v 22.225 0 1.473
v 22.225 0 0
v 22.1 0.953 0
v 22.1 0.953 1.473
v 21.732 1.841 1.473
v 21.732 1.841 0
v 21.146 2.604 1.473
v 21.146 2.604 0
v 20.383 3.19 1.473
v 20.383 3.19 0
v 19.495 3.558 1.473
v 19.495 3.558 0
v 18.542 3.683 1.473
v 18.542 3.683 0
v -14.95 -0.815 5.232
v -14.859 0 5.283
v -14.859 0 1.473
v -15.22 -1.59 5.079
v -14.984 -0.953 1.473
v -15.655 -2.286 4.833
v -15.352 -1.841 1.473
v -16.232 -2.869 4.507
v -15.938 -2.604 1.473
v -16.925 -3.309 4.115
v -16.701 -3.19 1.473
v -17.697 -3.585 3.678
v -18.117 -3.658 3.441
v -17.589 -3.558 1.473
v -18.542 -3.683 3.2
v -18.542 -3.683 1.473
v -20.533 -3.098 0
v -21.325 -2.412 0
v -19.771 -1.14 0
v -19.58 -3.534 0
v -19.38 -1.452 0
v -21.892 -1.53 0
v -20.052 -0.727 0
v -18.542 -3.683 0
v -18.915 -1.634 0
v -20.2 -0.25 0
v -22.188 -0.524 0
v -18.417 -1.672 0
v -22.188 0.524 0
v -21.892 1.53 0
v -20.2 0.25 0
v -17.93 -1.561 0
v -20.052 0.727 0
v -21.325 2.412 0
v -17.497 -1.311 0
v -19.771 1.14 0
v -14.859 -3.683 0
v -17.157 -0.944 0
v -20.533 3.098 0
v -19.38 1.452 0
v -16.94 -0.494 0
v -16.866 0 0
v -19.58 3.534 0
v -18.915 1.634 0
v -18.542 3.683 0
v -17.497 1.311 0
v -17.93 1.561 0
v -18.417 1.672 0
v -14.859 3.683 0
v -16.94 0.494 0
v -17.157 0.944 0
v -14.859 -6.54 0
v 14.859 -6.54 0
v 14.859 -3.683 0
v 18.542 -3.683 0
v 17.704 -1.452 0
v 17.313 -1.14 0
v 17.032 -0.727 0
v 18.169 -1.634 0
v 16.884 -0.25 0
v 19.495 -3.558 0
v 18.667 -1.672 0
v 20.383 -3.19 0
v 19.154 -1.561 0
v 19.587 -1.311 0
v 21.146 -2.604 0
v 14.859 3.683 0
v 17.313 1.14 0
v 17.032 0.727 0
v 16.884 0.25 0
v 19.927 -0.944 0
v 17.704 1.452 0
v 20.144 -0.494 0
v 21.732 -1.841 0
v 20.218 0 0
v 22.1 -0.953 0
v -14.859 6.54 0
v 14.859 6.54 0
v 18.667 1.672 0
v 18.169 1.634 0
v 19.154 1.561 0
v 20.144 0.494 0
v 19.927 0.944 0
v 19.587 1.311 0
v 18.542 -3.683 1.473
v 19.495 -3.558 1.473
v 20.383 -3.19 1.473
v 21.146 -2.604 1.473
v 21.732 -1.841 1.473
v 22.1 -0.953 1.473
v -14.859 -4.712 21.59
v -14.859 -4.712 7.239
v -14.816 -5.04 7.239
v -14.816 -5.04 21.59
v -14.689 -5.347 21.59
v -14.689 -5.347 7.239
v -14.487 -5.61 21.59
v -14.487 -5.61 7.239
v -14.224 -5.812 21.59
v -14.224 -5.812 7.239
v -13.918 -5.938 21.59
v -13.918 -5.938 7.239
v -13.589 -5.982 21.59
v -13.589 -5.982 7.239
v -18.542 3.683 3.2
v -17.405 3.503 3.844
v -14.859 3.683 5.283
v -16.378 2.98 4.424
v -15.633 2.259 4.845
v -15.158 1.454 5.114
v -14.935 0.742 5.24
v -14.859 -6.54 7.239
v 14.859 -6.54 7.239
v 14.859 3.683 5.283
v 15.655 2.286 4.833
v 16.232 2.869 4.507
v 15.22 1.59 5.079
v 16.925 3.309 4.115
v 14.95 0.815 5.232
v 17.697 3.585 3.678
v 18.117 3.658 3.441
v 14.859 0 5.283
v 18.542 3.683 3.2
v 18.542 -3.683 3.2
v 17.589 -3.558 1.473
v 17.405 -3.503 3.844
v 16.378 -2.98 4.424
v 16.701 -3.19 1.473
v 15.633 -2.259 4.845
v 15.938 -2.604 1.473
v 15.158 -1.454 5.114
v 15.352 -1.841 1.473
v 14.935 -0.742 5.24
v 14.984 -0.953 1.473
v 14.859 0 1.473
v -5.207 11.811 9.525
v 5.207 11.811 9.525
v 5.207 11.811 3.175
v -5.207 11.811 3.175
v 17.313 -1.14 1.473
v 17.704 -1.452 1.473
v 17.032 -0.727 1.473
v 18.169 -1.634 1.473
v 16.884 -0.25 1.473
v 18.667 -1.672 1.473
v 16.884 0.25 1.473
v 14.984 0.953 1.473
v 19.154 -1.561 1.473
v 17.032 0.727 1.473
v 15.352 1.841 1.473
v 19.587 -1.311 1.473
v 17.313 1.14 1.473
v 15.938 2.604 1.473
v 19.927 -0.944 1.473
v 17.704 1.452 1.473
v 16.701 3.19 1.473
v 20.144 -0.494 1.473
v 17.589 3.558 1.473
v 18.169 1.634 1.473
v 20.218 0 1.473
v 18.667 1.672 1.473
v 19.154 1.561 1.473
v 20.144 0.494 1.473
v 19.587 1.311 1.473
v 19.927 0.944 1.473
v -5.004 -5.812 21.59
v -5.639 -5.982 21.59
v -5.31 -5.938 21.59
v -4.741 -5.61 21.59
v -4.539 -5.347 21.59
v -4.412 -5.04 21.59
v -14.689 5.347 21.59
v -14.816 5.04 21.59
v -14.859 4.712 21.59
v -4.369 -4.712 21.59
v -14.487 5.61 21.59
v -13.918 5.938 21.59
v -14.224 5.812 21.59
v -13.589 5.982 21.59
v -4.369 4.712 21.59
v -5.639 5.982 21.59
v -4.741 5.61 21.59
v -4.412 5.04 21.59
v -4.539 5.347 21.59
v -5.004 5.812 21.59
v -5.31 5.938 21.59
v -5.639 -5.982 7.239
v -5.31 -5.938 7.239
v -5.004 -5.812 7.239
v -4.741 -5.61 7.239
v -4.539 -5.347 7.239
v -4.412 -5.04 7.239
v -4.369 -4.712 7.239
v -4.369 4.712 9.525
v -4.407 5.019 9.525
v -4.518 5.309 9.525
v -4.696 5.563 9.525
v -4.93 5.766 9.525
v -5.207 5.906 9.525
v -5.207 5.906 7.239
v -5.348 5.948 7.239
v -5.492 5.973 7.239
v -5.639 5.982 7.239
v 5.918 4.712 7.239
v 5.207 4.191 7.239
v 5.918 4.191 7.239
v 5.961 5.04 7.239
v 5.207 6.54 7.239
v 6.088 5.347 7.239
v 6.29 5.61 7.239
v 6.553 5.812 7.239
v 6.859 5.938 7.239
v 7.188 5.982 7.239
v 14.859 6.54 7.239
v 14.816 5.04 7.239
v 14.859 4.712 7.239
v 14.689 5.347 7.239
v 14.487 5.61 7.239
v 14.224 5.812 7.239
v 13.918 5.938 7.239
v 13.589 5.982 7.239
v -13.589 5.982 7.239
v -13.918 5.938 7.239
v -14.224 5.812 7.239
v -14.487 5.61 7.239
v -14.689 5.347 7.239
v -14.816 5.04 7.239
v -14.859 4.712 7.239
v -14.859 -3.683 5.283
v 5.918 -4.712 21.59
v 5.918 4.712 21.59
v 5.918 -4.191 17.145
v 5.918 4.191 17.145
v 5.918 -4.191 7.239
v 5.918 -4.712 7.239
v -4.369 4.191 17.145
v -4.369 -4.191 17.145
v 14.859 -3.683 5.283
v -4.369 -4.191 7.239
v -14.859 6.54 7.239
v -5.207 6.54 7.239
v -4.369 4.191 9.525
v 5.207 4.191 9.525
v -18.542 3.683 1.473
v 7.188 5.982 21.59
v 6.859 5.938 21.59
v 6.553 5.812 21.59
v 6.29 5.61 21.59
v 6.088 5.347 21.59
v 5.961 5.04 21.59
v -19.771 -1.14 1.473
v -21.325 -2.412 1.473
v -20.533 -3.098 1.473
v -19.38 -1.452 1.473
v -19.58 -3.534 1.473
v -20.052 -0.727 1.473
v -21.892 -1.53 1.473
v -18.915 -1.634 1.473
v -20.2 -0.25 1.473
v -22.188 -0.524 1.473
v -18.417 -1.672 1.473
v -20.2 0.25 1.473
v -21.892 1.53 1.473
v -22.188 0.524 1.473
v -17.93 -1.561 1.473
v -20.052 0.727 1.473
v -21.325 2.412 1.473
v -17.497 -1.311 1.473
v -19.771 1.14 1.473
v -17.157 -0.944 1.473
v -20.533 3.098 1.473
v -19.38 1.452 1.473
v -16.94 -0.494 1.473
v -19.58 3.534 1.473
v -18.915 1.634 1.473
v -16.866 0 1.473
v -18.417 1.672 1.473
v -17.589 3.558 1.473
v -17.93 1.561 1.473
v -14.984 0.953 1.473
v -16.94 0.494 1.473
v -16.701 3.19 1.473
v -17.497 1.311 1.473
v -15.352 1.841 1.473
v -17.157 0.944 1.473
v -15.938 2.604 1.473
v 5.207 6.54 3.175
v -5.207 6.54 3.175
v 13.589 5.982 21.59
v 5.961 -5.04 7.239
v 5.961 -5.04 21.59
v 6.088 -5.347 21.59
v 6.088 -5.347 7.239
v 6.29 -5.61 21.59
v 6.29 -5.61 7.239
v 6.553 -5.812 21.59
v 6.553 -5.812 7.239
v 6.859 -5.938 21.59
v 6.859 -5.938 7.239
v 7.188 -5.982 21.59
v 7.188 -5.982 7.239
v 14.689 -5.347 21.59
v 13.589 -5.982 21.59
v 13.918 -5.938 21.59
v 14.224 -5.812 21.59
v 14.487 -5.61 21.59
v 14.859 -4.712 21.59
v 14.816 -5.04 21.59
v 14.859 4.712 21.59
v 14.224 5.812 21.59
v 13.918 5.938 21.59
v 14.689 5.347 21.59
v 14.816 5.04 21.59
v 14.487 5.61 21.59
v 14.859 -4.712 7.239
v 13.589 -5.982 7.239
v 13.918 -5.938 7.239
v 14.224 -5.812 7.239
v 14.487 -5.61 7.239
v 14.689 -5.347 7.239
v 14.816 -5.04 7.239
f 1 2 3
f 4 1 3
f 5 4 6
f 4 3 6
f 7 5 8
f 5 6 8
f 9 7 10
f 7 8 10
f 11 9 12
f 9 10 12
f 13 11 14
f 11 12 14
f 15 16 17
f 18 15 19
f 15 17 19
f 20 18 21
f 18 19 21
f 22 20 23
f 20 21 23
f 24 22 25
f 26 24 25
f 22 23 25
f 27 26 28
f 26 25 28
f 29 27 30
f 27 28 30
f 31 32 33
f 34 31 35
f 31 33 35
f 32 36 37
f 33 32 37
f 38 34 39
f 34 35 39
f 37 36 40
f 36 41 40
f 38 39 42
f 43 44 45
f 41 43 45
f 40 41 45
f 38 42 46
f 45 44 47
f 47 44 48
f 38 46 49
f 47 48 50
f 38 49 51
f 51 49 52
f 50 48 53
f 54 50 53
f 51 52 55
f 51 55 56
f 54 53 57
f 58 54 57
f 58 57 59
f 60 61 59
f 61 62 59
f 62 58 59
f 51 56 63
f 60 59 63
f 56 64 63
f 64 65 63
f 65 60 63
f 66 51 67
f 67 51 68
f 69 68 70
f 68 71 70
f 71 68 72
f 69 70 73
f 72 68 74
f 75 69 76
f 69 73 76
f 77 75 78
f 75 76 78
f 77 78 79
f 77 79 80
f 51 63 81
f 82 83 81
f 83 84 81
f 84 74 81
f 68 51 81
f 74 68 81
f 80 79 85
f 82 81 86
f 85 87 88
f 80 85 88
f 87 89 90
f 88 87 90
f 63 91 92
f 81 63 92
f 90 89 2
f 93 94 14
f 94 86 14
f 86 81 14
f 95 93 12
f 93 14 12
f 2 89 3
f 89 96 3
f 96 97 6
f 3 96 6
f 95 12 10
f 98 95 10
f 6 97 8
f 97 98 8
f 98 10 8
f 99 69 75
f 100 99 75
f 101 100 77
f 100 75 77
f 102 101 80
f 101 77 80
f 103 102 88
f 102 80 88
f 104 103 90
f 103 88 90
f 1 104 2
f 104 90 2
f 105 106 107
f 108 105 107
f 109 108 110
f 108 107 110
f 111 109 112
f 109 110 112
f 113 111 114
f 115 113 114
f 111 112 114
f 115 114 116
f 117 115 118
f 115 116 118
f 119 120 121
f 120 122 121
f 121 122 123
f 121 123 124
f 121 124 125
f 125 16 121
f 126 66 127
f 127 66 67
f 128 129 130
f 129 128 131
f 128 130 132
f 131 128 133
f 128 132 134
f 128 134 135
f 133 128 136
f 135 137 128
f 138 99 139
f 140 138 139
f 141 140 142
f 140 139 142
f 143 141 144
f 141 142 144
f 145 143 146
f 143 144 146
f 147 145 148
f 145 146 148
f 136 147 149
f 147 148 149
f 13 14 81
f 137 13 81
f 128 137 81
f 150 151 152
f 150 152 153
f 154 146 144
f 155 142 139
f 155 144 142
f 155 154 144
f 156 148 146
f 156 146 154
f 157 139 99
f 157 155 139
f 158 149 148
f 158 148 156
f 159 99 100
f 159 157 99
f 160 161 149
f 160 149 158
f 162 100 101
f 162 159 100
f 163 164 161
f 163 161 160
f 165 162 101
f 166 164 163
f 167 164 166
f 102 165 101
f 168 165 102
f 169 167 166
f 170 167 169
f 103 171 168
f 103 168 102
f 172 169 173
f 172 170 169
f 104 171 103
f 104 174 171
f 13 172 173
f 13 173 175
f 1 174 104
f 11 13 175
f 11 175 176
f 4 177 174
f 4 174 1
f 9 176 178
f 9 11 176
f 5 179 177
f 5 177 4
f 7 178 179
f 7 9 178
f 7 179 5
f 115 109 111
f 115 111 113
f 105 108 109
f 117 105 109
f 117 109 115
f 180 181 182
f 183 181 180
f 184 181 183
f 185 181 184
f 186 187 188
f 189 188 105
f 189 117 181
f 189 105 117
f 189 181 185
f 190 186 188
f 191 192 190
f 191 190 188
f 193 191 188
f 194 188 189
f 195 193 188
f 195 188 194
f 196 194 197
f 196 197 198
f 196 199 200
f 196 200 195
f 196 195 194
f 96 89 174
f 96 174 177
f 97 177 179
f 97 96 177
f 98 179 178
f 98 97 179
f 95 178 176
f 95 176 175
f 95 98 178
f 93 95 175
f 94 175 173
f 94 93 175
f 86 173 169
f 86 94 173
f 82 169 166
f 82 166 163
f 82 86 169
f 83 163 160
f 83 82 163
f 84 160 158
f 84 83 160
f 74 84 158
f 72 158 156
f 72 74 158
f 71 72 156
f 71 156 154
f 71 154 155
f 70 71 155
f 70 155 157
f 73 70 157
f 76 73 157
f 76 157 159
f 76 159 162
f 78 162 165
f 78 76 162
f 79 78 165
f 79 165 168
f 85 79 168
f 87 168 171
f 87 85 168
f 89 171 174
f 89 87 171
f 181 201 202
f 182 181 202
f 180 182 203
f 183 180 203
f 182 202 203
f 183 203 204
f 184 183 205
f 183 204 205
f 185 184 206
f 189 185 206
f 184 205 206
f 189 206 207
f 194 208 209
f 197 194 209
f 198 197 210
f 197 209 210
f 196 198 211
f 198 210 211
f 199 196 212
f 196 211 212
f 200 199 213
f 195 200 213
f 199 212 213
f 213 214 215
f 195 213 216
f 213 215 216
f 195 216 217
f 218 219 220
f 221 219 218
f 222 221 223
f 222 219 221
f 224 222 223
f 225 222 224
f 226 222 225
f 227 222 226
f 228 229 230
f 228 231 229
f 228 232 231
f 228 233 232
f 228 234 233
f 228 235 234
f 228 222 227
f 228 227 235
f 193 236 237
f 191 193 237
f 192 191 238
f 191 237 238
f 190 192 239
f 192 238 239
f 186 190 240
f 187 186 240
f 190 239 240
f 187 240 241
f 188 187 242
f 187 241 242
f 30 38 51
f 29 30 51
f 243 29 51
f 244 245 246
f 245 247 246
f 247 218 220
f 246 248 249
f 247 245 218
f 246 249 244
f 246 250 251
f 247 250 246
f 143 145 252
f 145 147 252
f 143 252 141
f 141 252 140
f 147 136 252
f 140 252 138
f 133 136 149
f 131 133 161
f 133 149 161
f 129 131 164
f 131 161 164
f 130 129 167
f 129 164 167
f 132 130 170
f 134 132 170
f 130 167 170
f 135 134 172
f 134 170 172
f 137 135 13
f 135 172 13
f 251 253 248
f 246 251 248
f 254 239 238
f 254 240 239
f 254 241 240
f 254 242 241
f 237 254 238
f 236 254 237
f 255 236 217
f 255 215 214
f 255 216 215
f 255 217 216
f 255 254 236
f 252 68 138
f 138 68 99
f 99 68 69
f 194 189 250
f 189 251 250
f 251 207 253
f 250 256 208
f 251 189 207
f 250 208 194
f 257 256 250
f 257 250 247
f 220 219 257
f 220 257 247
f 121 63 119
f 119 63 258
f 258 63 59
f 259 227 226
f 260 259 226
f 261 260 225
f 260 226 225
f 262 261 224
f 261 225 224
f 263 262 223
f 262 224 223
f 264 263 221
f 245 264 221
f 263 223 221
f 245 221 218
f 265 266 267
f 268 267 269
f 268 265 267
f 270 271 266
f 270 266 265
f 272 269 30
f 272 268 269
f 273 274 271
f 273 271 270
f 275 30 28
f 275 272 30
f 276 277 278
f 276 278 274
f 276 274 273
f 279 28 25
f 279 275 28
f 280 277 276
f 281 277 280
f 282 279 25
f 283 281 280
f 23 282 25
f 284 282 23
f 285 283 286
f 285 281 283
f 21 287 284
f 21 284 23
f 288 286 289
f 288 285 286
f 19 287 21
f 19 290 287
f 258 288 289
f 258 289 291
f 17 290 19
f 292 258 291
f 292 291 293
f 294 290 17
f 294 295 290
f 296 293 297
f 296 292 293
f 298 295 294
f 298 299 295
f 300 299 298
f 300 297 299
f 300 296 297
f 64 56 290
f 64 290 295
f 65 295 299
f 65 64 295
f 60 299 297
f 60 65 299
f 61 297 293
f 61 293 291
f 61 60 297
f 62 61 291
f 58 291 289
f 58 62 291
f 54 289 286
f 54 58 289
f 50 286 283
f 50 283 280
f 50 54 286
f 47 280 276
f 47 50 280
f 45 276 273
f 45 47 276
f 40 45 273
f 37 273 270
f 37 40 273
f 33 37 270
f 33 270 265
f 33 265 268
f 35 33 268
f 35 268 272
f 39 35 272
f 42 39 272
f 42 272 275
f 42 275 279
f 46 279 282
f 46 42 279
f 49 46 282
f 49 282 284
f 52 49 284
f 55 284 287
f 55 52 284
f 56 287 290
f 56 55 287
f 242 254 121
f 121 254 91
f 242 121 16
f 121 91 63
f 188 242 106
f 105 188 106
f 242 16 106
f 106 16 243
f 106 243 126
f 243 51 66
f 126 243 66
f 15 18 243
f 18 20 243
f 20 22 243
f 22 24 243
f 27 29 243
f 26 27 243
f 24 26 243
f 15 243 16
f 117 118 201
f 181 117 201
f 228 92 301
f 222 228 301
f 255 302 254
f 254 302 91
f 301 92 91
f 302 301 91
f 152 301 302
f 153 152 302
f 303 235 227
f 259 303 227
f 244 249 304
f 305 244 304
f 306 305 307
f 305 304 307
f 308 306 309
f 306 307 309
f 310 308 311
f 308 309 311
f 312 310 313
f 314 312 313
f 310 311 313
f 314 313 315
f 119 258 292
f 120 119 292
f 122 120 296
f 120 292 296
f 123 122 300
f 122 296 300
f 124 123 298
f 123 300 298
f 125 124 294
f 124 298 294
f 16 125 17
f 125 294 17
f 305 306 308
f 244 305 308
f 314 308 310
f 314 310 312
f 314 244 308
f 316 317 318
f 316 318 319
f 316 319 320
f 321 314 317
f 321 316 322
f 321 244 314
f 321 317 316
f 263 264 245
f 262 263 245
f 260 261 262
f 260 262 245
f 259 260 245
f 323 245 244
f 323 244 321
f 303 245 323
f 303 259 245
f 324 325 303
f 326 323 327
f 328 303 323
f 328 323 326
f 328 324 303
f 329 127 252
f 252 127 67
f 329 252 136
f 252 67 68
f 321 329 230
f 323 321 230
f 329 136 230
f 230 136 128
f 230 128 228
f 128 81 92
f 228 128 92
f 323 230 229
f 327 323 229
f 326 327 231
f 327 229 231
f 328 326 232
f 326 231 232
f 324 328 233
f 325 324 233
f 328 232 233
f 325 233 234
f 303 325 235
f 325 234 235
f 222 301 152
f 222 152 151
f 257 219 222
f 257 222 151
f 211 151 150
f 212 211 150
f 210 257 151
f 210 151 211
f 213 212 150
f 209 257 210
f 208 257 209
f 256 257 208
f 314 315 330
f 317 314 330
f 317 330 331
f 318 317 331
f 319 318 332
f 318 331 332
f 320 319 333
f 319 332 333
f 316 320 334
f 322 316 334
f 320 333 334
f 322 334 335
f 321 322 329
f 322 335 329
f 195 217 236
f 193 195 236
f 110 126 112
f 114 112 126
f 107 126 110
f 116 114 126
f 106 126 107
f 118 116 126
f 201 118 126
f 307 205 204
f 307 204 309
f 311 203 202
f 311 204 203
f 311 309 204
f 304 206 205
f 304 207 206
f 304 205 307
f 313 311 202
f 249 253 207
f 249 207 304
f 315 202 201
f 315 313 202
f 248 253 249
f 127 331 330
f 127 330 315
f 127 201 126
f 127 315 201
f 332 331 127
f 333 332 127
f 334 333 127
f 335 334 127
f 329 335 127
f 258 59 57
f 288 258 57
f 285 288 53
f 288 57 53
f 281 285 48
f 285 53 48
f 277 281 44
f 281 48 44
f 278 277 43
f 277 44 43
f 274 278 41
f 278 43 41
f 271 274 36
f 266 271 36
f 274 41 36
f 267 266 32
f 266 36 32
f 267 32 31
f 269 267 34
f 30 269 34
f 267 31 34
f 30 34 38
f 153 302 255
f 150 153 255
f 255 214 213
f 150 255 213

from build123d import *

# Parameters (mm, degrees)
F0_R      = 1.6764
F1_DEPTH  = 1.4732
F3_DEPTH  = 3.81
F5_DEPTH  = 7.366
F7_DEPTH  = 7.239
F9_DEPTH  = 14.351
F10_W     = 10.287
F10_H     = 8.382
F11_DEPTH = 9.906
F12_W     = 10.414
F12_H     = 6.35
F13_DEPTH = 7.62


with BuildPart() as f1:
    # F0 (on Top) → F1 (new body)
    with BuildSketch(Plane.XY):
        Polygon((14.859, 3.683), (14.859, 6.5405), (-14.859, 6.5405), (-14.859, 3.683), (-14.859, 0), (-14.859, -3.683), (-14.859, -6.5405), (14.859, -6.5405), (14.859, -3.683), (14.859, 0), align=None)
        with BuildLine():
            Line((18.542, 3.683), (14.859, 3.683))
            Line((14.859, 3.683), (14.859, 0))
            ThreePointArc((14.859, 0), (15.937726, 2.604274), (18.542, 3.683))
        make_face()
        with BuildLine():
            Line((-14.859, 0), (-14.859, 3.683))
            Line((-14.859, 3.683), (-18.542, 3.683))
            ThreePointArc((-18.542, 3.683), (-15.937726, 2.604274), (-14.859, 0))
        make_face()
        with BuildLine():
            ThreePointArc((18.542, -3.683), (15.937726, -2.604274), (14.859, 0))
            Line((14.859, 0), (14.859, -3.683))
            Line((14.859, -3.683), (18.542, -3.683))
        make_face()
        with BuildLine():
            ThreePointArc((18.542, 3.683), (15.937726, 2.604274), (14.859, 0))
            ThreePointArc((14.859, 0), (15.937726, -2.604274), (18.542, -3.683))
            ThreePointArc((18.542, -3.683), (21.146274, -2.604274), (22.225, 0))
            ThreePointArc((22.225, 0), (21.146274, 2.604274), (18.542, 3.683))
        make_face()
        with Locations((18.542, 0)):
            Circle(F0_R, mode=Mode.SUBTRACT)
        with BuildLine():
            ThreePointArc((-18.542, -3.683), (-15.937726, -2.604274), (-14.859, 0))
            ThreePointArc((-14.859, 0), (-15.937726, 2.604274), (-18.542, 3.683))
            ThreePointArc((-18.542, 3.683), (-22.225, 0), (-18.542, -3.683))
        make_face()
        with Locations((-18.542, 0)):
            Circle(F0_R, mode=Mode.SUBTRACT)
        with BuildLine():
            Line((-14.859, -3.683), (-14.859, 0))
            ThreePointArc((-14.859, 0), (-15.937726, -2.604274), (-18.542, -3.683))
            Line((-18.542, -3.683), (-14.859, -3.683))
        make_face()
    extrude(amount=F1_DEPTH)



with BuildPart() as f3:
    # F2 (on face) → F3 (new body)
    with BuildSketch(Plane.XY.offset(1.4732)):
        with BuildLine():
            Line((-14.859, 3.683), (-18.542, 3.683))
            ThreePointArc((-18.542, 3.683), (-15.937726, 2.604274), (-14.859, 0))
            Line((-14.859, 0), (-14.859, 3.683))
        make_face()
        with BuildLine():
            Line((-14.859, -3.683), (-14.859, 0))
            ThreePointArc((-14.859, 0), (-15.937726, -2.604274), (-18.542, -3.683))
            Line((-18.542, -3.683), (-14.859, -3.683))
        make_face()
        with BuildLine():
            Line((14.859, -3.683), (18.542, -3.683))
            ThreePointArc((18.542, -3.683), (15.937726, -2.604274), (14.859, 0))
            Line((14.859, 0), (14.859, -3.683))
        make_face()
        with BuildLine():
            Line((14.859, 3.683), (14.859, 0))
            ThreePointArc((14.859, 0), (15.937726, 2.604274), (18.542, 3.683))
            Line((18.542, 3.683), (14.859, 3.683))
        make_face()
    extrude(amount=F3_DEPTH)

    # F4 (on face) → F5 (cut, through all)
    with BuildSketch(Plane.XZ.offset(3.683)):
        Polygon((-18.542, 5.2832), (-18.542, 3.2004), (-14.859, 5.2832), align=None)
        Polygon((14.859, 5.2832), (18.542, 3.2004), (18.542, 5.2832), align=None)
    extrude(amount=-F5_DEPTH, mode=Mode.SUBTRACT)


with BuildPart() as f1_1:
    add(f1.part)

    add(f3.part)  # F7 merges F3
    # F6 (on Top) → F7 (join)
    with BuildSketch(Plane.XY):
        Polygon((14.859, 3.683), (14.859, 6.5405), (-14.859, 6.5405), (-14.859, 3.683), (-14.859, 0), (-14.859, -3.683), (-14.859, -6.5405), (14.859, -6.5405), (14.859, -3.683), (14.859, 0), align=None)
    extrude(amount=F7_DEPTH)

    # F8 (on face) → F9 (join)
    with BuildSketch(Plane.XY.offset(7.239)):
        with BuildLine():
            ThreePointArc((-4.3688, 4.7117), (-4.740774, 5.609726), (-5.6388, 5.9817))
            Line((-5.6388, 5.9817), (-13.589, 5.9817))
            ThreePointArc((-13.589, 5.9817), (-14.487026, 5.609726), (-14.859, 4.7117))
            Line((-14.859, 4.7117), (-14.859, -4.7117))
            ThreePointArc((-14.859, -4.7117), (-14.487026, -5.609726), (-13.589, -5.9817))
            Line((-13.589, -5.9817), (-5.6388, -5.9817))
            ThreePointArc((-5.6388, -5.9817), (-4.740774, -5.609726), (-4.3688, -4.7117))
            Line((-4.3688, -4.7117), (-4.3688, 4.7117))
        make_face()
        with BuildLine():
            ThreePointArc((14.859, 4.7117), (14.487026, 5.609726), (13.589, 5.9817))
            Line((13.589, 5.9817), (7.1882, 5.9817))
            ThreePointArc((7.1882, 5.9817), (6.290174, 5.609726), (5.9182, 4.7117))
            Line((5.9182, 4.7117), (5.9182, -4.7117))
            ThreePointArc((5.9182, -4.7117), (6.290174, -5.609726), (7.1882, -5.9817))
            Line((7.1882, -5.9817), (13.589, -5.9817))
            ThreePointArc((13.589, -5.9817), (14.487026, -5.609726), (14.859, -4.7117))
            Line((14.859, -4.7117), (14.859, 4.7117))
        make_face()
    extrude(amount=F9_DEPTH)

    # F10 (on face) → F11 (join)
    with BuildSketch(Plane.XY.offset(7.239)):
        with Locations((0.7747, 0)):
            Rectangle(F10_W, F10_H)
    extrude(amount=F11_DEPTH)

    # F12 (on face) → F13 (join)
    with BuildSketch(Plane(origin=(0, 4.191, 0), x_dir=(-1, 0, 0), z_dir=(0, 1, 0))):
        with Locations((0, 6.35)):
            Rectangle(F12_W, F12_H)
    extrude(amount=F13_DEPTH)


solid = f1_1.part
